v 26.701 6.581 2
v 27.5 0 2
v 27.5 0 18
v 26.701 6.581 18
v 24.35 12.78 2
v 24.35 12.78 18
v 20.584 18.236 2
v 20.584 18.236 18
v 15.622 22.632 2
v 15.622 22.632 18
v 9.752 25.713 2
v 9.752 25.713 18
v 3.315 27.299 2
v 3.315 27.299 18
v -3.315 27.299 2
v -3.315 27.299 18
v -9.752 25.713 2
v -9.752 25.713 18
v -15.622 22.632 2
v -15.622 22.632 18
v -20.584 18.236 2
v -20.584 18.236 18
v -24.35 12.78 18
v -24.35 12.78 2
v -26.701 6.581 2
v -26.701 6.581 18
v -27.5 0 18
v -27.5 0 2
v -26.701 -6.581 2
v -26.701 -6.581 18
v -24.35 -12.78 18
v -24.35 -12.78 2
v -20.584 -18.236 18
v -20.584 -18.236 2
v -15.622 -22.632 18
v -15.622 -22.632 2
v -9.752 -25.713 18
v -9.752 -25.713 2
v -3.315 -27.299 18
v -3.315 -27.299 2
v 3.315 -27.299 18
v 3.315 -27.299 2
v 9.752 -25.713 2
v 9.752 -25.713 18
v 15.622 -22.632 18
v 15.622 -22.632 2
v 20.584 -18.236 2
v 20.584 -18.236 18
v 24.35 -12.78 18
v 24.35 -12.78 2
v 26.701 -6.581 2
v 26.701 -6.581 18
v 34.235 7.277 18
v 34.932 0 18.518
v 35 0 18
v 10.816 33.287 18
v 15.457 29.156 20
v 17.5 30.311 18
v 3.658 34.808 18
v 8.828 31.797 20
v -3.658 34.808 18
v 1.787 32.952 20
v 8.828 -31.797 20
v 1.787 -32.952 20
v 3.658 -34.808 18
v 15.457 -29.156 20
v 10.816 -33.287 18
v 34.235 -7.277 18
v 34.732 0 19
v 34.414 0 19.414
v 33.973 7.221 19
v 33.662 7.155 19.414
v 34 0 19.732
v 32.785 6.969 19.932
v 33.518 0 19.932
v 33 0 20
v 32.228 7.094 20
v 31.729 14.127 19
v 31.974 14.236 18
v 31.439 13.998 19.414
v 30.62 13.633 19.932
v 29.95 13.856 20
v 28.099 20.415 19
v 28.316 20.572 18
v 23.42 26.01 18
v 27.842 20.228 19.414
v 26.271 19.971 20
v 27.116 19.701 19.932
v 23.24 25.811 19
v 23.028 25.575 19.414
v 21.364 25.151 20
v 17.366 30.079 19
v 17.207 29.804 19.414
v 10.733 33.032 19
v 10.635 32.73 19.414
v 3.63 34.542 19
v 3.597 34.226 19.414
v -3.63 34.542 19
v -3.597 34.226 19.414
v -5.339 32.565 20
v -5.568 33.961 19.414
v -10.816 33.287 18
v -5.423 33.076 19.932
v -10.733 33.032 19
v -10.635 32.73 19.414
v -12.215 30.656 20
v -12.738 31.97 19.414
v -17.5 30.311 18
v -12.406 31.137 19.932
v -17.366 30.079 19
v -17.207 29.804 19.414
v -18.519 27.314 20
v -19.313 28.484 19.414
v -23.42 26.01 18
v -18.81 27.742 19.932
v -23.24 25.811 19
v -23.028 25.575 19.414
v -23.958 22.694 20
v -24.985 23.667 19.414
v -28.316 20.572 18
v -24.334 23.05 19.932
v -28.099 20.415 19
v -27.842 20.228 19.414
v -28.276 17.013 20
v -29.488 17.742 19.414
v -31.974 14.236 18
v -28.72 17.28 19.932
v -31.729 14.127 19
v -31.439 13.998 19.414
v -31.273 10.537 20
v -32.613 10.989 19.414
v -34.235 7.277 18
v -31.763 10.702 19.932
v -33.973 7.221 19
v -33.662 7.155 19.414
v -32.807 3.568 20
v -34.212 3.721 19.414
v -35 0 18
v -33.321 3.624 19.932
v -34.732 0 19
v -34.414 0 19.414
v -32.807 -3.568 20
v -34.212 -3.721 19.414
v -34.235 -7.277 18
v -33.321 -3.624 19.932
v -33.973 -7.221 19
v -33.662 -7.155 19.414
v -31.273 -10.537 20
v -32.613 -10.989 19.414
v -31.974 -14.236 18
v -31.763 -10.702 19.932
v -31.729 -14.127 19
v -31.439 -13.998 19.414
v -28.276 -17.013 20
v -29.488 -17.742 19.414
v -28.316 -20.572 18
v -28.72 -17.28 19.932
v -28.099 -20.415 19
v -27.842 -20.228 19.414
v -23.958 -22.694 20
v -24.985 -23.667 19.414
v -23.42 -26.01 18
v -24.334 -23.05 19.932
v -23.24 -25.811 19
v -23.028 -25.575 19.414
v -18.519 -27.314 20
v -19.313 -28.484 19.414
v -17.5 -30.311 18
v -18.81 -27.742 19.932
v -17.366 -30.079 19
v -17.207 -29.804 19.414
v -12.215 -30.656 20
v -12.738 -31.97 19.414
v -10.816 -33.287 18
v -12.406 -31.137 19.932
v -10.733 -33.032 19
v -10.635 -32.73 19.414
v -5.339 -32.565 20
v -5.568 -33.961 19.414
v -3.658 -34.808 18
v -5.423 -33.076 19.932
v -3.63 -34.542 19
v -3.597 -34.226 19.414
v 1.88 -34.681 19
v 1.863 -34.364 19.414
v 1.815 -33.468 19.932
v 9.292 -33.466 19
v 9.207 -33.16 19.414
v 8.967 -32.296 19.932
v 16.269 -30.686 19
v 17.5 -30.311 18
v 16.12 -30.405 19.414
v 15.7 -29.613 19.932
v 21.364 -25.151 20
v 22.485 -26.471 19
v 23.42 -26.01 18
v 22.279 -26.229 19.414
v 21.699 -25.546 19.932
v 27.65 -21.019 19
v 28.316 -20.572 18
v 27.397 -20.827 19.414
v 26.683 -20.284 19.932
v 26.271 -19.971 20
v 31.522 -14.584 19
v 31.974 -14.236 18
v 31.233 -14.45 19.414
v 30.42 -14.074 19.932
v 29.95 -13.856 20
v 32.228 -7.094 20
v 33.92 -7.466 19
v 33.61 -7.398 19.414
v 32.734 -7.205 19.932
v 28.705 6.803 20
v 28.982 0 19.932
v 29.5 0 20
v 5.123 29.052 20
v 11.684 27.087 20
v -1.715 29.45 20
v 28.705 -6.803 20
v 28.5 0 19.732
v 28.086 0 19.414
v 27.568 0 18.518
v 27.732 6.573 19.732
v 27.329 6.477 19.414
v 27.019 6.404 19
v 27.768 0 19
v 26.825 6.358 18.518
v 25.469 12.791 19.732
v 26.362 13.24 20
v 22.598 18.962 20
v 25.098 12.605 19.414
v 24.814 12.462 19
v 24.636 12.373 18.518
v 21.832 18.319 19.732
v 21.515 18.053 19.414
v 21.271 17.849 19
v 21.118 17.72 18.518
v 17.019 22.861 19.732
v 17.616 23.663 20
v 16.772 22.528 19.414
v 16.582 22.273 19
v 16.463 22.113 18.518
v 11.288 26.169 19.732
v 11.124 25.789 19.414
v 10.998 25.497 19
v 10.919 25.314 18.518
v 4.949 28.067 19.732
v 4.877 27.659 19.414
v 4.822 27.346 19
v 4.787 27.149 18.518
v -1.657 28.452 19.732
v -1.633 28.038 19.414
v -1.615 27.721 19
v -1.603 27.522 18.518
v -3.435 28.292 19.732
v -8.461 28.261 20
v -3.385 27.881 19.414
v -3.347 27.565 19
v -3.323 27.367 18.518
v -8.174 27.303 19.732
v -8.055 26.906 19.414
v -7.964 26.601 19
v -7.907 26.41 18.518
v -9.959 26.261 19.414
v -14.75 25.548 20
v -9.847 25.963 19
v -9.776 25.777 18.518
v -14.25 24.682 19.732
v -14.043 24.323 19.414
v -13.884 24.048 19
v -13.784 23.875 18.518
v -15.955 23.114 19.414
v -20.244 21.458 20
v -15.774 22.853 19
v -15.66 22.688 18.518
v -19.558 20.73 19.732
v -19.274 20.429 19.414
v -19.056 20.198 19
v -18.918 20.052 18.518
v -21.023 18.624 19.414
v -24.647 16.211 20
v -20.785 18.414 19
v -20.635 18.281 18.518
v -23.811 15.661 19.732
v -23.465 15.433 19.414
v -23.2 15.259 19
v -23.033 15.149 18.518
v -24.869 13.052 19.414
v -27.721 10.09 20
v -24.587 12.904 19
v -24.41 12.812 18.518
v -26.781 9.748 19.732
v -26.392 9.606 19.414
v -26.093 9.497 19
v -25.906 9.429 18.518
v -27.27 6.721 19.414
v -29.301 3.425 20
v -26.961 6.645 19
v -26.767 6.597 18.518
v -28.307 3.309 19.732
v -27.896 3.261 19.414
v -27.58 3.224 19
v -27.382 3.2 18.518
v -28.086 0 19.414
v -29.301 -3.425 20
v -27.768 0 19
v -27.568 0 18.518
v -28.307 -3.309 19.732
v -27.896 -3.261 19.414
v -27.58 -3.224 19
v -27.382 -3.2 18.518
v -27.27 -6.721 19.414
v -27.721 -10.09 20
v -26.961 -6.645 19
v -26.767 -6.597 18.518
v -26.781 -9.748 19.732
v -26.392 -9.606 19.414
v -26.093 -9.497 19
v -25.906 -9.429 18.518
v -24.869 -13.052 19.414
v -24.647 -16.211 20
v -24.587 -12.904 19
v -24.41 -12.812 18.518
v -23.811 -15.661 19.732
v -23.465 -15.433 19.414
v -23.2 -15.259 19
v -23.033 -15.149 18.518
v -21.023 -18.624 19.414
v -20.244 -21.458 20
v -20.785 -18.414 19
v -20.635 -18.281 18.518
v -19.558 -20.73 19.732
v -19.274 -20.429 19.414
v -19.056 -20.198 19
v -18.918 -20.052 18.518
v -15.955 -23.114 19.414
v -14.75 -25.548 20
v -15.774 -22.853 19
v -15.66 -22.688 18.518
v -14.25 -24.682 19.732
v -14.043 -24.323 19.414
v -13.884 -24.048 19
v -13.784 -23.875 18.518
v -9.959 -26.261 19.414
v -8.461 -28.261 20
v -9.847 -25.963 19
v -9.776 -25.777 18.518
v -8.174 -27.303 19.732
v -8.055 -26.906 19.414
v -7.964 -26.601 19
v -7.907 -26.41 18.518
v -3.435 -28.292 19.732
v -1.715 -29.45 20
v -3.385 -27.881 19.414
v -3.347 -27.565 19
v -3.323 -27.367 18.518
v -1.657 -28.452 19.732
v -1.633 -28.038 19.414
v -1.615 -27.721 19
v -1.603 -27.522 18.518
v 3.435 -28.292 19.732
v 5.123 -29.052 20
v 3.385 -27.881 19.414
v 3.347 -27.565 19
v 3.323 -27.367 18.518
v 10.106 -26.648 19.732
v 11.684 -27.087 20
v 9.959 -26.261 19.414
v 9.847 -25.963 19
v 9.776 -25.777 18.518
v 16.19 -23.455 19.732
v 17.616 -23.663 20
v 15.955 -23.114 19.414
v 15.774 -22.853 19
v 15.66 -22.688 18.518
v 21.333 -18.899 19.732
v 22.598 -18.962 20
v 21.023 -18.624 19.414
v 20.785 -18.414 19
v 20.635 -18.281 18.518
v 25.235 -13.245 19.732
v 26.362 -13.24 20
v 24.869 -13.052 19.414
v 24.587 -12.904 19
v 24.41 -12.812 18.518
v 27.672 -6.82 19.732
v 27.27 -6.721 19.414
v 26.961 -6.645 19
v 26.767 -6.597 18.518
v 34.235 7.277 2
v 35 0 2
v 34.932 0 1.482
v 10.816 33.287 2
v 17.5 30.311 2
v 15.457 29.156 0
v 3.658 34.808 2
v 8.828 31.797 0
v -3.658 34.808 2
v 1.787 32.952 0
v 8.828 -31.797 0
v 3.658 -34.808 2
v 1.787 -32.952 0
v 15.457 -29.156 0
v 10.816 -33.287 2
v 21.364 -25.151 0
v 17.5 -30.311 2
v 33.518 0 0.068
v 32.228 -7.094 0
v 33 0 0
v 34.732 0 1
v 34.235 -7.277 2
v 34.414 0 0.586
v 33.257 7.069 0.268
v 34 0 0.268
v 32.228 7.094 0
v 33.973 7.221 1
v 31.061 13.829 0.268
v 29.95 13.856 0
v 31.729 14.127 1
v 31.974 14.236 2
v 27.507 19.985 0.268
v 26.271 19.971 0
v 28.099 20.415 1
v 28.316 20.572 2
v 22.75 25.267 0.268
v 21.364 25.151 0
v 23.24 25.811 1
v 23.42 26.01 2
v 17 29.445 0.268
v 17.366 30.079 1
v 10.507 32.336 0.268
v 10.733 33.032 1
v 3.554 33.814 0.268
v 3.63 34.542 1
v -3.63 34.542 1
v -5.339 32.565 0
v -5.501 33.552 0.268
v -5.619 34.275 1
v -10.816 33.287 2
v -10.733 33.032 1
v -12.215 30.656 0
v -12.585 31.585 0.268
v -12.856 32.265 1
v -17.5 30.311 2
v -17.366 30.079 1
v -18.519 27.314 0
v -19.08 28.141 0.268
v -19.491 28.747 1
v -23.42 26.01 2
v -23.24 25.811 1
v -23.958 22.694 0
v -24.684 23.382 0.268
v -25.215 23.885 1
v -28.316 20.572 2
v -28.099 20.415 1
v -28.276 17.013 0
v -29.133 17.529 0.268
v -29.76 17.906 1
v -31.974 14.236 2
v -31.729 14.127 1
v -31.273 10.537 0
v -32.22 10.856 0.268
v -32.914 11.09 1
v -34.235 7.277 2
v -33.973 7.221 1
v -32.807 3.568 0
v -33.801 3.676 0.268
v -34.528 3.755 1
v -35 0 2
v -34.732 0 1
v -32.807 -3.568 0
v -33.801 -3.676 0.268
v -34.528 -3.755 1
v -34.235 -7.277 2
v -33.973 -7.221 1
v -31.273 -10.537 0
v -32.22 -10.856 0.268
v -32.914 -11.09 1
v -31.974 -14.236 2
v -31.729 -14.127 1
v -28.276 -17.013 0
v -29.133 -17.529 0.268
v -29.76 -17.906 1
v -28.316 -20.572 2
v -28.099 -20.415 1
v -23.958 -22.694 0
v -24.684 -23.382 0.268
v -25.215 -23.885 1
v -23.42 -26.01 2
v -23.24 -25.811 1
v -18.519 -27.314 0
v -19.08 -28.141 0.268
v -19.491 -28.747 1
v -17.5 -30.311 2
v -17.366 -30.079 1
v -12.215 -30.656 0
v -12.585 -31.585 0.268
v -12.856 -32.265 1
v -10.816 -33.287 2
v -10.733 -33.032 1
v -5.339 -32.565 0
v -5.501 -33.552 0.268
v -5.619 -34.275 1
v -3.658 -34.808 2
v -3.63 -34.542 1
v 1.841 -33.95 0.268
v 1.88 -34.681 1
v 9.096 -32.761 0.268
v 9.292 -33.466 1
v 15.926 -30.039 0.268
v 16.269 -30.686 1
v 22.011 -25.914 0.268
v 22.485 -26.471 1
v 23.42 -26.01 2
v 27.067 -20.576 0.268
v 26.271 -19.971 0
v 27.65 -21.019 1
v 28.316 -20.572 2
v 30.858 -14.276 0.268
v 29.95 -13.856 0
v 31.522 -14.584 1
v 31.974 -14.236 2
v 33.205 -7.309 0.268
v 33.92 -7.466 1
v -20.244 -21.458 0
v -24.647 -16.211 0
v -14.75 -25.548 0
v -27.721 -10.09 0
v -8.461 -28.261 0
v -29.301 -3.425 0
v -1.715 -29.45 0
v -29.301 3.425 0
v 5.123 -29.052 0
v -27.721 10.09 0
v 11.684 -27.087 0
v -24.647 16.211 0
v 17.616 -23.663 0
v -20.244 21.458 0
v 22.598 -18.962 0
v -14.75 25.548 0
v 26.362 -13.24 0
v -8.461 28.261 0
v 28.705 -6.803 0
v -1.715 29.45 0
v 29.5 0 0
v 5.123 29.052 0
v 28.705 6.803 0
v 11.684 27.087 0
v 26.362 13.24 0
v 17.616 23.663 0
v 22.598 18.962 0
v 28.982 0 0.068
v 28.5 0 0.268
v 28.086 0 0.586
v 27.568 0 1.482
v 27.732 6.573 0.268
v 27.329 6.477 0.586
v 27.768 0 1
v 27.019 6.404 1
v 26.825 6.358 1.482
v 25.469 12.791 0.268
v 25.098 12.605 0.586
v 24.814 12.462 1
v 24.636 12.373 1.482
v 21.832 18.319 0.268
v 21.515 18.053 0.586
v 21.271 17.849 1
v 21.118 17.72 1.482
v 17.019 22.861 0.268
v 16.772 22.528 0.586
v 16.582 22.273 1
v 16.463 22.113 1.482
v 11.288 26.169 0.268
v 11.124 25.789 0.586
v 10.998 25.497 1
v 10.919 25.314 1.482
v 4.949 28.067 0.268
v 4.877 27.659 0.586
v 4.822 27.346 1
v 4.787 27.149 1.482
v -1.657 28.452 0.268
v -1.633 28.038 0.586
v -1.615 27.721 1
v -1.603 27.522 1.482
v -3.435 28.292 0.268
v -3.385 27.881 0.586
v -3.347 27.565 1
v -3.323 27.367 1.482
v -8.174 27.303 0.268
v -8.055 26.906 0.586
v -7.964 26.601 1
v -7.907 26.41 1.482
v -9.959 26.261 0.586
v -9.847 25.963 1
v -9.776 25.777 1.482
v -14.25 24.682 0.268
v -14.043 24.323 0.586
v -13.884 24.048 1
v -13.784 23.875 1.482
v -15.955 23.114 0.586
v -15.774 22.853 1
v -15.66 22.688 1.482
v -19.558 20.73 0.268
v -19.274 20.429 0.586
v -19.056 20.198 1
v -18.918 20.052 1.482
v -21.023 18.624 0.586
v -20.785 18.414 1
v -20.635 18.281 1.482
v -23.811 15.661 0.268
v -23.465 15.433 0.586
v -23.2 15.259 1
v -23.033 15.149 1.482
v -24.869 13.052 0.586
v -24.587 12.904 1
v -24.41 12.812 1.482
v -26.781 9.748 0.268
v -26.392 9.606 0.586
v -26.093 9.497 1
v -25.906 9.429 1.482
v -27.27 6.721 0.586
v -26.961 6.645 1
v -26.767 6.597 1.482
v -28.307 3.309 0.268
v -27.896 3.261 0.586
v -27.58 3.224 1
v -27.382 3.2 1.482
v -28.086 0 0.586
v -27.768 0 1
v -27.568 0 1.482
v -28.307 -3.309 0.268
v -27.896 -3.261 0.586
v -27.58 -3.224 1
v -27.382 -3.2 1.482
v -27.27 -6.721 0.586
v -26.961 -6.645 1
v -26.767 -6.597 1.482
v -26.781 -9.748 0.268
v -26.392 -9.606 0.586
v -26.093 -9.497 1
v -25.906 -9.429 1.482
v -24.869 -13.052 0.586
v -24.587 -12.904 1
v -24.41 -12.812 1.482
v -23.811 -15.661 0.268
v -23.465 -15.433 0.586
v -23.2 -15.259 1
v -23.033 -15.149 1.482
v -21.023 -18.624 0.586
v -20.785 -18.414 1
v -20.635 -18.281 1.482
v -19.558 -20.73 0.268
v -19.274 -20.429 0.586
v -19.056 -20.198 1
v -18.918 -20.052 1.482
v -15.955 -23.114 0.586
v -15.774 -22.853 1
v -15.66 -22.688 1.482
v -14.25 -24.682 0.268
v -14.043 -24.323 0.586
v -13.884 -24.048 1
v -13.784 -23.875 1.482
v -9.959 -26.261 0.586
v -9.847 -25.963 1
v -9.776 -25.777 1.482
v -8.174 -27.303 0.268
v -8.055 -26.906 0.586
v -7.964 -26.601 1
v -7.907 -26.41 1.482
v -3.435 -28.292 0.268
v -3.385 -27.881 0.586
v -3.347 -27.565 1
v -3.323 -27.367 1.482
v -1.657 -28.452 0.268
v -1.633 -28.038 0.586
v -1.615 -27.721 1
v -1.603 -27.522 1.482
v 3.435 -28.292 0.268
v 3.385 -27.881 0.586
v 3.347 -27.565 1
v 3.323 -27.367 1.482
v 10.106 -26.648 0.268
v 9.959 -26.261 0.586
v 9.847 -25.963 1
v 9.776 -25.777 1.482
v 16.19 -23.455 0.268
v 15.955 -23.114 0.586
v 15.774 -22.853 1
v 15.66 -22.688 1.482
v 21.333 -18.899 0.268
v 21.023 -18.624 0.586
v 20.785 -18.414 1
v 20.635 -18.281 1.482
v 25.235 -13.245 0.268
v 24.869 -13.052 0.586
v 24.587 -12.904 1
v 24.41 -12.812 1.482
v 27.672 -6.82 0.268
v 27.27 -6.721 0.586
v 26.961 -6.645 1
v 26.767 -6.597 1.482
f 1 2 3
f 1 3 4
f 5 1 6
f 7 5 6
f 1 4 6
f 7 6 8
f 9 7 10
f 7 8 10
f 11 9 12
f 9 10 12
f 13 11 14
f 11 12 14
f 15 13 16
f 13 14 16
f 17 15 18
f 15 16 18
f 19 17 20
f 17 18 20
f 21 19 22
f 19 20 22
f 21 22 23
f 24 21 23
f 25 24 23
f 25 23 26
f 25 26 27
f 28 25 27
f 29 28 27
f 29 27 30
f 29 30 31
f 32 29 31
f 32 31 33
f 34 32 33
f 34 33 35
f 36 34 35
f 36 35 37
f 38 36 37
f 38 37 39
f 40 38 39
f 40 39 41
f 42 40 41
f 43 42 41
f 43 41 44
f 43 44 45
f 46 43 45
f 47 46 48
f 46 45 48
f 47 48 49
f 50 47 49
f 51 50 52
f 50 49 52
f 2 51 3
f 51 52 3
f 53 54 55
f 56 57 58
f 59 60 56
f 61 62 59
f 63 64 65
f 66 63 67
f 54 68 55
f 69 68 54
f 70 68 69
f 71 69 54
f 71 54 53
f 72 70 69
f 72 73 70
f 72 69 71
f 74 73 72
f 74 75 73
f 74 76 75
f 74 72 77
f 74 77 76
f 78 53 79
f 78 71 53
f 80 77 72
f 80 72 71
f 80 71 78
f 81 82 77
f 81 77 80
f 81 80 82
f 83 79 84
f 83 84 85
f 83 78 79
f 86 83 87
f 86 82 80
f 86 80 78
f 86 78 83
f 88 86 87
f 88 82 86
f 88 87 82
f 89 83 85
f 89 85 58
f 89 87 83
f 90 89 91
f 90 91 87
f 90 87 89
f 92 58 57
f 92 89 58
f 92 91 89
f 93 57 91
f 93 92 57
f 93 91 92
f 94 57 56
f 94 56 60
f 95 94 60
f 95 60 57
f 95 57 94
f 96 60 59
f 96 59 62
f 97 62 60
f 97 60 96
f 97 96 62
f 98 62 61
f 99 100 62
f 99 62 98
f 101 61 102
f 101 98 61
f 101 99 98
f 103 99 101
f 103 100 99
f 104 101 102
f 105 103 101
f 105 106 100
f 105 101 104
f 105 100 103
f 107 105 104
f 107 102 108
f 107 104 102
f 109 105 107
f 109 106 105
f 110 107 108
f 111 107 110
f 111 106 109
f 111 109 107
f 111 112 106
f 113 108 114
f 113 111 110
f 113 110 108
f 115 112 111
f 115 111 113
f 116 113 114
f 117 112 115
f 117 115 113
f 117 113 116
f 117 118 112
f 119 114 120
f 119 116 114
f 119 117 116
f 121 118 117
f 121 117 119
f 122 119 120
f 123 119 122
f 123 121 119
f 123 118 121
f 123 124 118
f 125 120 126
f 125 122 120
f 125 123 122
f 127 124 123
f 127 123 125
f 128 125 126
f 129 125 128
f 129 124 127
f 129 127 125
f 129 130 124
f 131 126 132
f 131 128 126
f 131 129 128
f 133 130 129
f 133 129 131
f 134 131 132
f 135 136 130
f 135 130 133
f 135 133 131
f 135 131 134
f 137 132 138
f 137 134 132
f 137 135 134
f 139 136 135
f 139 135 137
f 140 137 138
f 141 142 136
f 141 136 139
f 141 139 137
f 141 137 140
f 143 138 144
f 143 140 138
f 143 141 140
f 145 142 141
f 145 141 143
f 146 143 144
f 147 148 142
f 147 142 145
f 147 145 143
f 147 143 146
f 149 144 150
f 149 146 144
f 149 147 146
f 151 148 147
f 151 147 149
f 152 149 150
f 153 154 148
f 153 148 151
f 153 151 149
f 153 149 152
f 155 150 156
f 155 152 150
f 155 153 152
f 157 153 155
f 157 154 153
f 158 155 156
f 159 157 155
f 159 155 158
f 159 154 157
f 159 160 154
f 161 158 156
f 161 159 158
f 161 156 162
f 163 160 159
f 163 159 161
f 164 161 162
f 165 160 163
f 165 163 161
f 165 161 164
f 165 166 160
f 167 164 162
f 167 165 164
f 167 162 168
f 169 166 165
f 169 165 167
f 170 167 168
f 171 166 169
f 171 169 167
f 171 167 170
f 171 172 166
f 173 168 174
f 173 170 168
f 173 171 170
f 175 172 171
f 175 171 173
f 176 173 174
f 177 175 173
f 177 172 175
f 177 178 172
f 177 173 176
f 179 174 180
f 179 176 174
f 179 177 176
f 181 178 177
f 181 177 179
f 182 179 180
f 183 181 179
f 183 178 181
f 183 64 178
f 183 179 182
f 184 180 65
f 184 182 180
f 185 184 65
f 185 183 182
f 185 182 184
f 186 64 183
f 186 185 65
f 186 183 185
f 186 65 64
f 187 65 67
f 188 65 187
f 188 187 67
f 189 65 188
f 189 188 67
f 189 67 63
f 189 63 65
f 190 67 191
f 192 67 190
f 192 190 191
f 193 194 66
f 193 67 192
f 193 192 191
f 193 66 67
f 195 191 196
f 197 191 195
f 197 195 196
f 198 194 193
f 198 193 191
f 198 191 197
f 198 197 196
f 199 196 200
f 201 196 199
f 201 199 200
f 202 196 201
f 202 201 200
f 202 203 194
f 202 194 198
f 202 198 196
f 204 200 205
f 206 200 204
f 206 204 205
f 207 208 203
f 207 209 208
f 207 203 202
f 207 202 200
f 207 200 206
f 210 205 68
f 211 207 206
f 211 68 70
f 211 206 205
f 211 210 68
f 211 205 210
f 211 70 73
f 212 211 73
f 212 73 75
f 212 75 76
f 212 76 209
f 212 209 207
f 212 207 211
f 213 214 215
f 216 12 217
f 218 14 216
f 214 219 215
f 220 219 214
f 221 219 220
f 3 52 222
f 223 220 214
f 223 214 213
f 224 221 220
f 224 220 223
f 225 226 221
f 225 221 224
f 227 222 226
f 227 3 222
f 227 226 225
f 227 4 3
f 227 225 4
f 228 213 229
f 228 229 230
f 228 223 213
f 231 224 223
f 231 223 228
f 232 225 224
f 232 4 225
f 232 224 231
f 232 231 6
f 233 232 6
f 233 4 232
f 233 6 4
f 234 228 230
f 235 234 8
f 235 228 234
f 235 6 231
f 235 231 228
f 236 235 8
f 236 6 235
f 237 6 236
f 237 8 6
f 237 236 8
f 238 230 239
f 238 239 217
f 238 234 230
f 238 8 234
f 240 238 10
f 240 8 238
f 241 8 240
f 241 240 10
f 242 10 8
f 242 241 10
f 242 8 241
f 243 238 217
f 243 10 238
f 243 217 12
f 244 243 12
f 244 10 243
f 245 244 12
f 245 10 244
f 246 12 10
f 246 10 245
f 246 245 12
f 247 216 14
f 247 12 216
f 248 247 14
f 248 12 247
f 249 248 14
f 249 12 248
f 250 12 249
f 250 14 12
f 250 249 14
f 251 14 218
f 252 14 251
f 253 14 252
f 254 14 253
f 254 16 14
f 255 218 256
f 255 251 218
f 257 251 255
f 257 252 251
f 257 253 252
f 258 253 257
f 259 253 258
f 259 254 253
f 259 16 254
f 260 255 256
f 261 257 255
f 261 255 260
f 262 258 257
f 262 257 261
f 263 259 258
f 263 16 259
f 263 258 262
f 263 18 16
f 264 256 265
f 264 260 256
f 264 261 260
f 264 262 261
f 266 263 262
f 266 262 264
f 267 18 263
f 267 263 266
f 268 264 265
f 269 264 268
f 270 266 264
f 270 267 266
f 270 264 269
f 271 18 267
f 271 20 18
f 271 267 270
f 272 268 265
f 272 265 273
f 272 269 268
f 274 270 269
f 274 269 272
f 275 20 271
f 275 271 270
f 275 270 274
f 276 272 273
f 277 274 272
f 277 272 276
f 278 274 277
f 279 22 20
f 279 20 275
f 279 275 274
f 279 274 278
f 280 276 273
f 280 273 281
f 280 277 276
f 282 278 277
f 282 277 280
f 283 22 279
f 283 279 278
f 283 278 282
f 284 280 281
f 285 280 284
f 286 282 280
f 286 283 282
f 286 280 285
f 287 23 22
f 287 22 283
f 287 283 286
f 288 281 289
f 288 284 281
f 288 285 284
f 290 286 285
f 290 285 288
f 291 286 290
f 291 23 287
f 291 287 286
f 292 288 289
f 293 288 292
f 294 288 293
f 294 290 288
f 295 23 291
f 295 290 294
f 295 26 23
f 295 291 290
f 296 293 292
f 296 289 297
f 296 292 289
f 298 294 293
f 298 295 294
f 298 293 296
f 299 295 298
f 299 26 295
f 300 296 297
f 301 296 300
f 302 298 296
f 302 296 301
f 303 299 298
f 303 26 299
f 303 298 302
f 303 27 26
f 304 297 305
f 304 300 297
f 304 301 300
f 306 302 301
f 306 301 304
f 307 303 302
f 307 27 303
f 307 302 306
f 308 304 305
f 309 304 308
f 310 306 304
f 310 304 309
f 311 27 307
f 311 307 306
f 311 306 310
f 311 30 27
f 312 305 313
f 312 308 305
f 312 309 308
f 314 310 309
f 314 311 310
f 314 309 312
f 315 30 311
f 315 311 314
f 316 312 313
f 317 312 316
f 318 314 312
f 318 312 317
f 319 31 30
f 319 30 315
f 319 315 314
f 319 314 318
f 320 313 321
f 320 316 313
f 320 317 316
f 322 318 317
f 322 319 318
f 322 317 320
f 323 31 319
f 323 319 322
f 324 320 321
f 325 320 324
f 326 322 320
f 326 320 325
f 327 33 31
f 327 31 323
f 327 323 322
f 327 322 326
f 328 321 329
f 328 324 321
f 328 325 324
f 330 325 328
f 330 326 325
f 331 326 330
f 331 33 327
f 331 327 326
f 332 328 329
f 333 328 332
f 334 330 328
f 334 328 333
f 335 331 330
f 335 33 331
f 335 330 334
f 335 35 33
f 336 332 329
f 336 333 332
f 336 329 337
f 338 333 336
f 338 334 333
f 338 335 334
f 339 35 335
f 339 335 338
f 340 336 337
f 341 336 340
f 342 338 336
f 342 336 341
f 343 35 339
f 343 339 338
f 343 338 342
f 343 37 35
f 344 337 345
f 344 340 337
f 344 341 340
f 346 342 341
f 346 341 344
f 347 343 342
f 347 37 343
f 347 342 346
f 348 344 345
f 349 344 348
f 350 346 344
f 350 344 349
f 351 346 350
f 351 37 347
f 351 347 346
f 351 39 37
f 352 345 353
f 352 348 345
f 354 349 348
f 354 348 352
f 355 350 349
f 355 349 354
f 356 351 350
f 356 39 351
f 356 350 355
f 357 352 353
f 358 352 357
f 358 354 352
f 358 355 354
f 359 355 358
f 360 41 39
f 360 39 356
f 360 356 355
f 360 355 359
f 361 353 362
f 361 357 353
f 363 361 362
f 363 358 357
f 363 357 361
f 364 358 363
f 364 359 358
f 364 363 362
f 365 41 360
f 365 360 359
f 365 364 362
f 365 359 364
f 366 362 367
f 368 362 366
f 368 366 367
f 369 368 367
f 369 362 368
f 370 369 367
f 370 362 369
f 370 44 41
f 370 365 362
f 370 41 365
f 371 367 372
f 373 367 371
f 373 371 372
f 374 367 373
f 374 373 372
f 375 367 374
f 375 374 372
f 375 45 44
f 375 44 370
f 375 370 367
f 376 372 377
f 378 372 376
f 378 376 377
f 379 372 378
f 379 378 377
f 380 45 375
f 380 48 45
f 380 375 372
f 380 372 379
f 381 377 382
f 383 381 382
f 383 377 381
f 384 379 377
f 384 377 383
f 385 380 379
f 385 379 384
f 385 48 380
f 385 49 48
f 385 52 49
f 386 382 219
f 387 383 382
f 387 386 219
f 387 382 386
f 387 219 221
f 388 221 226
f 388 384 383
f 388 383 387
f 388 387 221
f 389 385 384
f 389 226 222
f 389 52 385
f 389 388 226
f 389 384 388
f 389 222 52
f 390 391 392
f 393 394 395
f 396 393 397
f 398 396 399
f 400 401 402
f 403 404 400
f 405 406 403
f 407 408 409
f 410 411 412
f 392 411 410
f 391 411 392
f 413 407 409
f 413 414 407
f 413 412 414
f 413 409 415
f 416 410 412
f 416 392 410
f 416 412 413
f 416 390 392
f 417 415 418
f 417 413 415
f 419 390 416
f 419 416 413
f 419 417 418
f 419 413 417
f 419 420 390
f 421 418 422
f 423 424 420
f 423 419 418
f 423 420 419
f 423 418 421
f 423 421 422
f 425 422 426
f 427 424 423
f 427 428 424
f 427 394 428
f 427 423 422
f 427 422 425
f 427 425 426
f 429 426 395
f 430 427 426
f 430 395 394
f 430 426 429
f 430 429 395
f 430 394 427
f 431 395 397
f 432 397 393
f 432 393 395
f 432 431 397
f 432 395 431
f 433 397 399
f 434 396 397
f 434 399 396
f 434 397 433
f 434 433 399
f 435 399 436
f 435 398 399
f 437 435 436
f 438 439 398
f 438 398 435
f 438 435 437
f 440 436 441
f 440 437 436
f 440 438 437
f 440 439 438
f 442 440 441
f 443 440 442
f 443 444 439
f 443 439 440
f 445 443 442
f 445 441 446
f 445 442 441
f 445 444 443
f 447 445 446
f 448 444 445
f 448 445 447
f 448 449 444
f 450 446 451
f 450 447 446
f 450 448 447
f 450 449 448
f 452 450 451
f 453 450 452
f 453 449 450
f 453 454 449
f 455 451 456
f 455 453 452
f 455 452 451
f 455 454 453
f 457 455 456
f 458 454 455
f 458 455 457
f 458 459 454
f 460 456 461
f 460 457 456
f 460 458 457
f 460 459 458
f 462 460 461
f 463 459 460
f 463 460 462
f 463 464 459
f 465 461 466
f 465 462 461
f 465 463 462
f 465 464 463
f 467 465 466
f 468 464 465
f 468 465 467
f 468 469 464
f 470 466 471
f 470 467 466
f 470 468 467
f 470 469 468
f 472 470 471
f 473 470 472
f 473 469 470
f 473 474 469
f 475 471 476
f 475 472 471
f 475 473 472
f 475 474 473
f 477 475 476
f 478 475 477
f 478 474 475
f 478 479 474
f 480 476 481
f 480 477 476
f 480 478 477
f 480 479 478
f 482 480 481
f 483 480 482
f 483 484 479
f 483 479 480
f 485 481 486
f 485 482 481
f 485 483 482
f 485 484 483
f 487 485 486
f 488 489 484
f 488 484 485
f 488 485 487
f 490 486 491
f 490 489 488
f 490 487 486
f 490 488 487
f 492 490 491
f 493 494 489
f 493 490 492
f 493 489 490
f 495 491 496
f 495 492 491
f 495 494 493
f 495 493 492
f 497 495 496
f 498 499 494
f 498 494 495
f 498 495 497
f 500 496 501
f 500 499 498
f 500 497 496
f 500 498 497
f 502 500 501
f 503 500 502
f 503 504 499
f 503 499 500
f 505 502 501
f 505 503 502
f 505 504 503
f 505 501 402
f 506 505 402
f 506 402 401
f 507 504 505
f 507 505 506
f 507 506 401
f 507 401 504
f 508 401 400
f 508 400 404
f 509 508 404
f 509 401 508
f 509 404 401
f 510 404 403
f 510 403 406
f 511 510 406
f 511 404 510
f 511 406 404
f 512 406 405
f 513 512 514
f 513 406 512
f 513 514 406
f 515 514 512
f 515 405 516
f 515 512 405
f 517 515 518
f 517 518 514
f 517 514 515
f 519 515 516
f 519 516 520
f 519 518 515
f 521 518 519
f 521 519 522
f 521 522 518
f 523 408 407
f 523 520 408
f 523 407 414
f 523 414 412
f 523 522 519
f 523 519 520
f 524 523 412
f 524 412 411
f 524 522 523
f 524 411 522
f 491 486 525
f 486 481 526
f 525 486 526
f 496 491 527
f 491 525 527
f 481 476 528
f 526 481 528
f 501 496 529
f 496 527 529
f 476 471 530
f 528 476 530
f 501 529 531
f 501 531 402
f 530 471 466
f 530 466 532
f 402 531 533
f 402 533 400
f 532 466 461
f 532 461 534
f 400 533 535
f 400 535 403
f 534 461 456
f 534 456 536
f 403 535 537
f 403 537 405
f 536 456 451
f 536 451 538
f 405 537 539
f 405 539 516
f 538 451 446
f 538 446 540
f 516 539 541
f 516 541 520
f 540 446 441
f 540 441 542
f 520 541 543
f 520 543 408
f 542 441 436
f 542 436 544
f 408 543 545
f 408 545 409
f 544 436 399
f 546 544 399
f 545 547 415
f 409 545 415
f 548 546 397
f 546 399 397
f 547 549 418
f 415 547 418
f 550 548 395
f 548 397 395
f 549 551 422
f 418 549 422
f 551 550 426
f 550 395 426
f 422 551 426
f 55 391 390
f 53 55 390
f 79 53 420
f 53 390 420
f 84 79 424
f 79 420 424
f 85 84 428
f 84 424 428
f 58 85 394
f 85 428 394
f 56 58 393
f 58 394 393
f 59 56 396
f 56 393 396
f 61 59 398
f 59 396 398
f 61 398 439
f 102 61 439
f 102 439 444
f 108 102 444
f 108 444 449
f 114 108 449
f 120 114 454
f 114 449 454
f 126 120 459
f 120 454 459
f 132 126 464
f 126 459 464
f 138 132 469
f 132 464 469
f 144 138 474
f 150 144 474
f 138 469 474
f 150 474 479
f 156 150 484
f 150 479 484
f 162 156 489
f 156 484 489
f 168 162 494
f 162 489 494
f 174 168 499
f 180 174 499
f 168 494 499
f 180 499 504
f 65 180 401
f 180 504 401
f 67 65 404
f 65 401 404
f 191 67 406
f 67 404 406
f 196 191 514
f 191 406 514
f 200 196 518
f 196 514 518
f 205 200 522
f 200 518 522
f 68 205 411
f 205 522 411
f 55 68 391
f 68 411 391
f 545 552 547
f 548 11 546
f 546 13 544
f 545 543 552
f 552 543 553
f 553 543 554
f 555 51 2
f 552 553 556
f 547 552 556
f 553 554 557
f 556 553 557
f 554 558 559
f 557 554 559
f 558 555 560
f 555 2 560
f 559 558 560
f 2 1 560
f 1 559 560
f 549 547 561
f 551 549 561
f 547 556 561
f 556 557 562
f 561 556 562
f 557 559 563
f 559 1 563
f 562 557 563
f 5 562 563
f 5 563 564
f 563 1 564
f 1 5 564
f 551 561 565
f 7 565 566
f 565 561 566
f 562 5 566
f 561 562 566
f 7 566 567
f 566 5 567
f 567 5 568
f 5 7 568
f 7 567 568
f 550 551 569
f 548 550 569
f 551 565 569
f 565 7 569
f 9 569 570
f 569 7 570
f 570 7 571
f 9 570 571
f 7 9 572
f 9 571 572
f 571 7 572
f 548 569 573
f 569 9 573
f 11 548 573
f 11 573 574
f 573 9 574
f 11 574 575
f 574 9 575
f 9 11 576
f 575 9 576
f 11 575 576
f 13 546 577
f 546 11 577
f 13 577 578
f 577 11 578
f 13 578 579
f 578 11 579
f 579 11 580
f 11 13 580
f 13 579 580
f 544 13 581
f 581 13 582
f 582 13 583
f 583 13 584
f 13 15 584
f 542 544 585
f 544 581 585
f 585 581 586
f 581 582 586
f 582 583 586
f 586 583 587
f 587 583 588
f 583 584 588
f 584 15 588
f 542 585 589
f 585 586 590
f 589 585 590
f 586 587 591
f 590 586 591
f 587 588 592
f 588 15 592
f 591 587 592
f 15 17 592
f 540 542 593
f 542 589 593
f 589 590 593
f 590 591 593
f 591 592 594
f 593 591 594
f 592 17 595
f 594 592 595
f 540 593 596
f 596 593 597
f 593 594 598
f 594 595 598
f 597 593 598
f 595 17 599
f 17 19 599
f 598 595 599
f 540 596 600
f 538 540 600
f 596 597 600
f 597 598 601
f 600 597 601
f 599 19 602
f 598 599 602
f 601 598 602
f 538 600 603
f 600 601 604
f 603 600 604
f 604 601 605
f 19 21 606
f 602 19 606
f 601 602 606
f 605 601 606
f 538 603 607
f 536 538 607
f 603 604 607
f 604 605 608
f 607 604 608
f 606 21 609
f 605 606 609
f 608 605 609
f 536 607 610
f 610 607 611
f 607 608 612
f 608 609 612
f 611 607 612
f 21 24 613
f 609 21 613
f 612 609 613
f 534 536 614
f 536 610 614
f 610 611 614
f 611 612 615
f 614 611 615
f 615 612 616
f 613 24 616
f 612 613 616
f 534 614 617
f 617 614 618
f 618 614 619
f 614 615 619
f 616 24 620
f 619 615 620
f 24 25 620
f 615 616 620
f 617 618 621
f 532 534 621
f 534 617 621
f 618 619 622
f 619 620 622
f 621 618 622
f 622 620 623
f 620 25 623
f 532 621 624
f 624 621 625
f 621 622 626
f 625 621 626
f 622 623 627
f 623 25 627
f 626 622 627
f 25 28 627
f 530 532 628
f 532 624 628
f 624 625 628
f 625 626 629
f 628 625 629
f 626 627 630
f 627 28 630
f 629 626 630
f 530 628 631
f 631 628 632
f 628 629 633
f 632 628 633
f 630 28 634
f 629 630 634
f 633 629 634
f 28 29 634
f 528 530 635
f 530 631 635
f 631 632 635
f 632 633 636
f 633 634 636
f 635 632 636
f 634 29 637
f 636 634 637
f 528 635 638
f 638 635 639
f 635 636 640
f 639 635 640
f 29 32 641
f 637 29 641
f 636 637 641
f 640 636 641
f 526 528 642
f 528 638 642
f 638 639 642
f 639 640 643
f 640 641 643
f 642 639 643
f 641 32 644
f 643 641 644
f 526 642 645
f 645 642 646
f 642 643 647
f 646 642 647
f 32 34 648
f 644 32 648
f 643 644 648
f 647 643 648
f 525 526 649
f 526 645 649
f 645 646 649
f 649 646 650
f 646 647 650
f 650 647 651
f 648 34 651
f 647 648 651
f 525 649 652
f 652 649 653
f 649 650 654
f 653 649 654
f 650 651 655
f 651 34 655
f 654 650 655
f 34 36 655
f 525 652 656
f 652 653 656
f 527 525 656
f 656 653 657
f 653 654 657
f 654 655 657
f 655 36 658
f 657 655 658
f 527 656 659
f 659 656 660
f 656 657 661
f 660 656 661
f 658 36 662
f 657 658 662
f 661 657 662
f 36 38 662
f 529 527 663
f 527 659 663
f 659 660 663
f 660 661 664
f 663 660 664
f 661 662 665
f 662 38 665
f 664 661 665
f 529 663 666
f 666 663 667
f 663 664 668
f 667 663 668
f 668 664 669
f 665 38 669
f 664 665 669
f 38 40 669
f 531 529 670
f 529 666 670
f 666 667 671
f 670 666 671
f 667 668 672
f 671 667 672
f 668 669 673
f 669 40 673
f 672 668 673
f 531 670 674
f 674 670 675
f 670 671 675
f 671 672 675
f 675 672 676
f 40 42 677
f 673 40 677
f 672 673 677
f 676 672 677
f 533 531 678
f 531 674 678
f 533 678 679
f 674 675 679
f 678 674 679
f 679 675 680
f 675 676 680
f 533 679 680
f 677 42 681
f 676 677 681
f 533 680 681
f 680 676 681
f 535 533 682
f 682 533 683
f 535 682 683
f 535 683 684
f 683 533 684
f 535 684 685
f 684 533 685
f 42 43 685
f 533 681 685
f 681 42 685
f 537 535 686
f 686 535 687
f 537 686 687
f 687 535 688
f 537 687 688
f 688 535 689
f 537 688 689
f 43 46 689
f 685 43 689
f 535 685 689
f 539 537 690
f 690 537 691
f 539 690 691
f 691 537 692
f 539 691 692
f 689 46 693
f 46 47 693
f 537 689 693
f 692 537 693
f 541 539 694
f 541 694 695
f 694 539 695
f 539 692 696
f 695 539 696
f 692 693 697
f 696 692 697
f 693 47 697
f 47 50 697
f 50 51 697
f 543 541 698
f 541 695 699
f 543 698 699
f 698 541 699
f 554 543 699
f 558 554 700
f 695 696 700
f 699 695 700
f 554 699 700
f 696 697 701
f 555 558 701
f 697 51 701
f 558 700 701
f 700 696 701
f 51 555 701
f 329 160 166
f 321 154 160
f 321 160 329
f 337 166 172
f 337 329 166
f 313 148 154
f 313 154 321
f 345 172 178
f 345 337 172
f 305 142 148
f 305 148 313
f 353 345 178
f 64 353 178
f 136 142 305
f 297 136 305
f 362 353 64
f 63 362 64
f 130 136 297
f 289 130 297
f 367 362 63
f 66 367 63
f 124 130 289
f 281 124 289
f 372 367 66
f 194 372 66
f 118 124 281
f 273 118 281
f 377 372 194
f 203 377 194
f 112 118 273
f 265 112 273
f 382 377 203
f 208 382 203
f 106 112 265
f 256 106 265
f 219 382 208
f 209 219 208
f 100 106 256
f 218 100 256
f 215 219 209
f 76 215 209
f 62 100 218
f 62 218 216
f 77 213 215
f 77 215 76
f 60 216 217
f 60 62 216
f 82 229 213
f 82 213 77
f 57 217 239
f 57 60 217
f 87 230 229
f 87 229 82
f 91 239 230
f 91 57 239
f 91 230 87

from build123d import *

# Parameters (mm, degrees)
F0_R     = 35
F1_DEPTH = 20
F2_R     = 27.5
F3_DEPTH = 25
F4_R     = 2
F5_R     = 2


with BuildPart() as f1:
    # F0 (on Top) → F1 (new body)
    with BuildSketch(Plane.XY):
        Circle(F0_R)
    extrude(amount=F1_DEPTH)

    # F2 (on face) → F3 (cut)
    with BuildSketch(Plane.XY.offset(20)):
        Circle(F2_R)
    extrude(amount=-F3_DEPTH, mode=Mode.SUBTRACT)

    # F4
    f4_edges = [f1.edges().sort_by_distance(p)[0] for p in [
        (-27.5, 0, 20),
        (-27.5, 0, 0),
    ]]
    fillet(f4_edges, radius=F4_R)

    # F5
    f5_edges = [f1.edges().sort_by_distance(p)[0] for p in [
        (-35, 0, 20),
        (-35, 0, 0),
    ]]
    fillet(f5_edges, radius=F5_R)


solid = f1.part
